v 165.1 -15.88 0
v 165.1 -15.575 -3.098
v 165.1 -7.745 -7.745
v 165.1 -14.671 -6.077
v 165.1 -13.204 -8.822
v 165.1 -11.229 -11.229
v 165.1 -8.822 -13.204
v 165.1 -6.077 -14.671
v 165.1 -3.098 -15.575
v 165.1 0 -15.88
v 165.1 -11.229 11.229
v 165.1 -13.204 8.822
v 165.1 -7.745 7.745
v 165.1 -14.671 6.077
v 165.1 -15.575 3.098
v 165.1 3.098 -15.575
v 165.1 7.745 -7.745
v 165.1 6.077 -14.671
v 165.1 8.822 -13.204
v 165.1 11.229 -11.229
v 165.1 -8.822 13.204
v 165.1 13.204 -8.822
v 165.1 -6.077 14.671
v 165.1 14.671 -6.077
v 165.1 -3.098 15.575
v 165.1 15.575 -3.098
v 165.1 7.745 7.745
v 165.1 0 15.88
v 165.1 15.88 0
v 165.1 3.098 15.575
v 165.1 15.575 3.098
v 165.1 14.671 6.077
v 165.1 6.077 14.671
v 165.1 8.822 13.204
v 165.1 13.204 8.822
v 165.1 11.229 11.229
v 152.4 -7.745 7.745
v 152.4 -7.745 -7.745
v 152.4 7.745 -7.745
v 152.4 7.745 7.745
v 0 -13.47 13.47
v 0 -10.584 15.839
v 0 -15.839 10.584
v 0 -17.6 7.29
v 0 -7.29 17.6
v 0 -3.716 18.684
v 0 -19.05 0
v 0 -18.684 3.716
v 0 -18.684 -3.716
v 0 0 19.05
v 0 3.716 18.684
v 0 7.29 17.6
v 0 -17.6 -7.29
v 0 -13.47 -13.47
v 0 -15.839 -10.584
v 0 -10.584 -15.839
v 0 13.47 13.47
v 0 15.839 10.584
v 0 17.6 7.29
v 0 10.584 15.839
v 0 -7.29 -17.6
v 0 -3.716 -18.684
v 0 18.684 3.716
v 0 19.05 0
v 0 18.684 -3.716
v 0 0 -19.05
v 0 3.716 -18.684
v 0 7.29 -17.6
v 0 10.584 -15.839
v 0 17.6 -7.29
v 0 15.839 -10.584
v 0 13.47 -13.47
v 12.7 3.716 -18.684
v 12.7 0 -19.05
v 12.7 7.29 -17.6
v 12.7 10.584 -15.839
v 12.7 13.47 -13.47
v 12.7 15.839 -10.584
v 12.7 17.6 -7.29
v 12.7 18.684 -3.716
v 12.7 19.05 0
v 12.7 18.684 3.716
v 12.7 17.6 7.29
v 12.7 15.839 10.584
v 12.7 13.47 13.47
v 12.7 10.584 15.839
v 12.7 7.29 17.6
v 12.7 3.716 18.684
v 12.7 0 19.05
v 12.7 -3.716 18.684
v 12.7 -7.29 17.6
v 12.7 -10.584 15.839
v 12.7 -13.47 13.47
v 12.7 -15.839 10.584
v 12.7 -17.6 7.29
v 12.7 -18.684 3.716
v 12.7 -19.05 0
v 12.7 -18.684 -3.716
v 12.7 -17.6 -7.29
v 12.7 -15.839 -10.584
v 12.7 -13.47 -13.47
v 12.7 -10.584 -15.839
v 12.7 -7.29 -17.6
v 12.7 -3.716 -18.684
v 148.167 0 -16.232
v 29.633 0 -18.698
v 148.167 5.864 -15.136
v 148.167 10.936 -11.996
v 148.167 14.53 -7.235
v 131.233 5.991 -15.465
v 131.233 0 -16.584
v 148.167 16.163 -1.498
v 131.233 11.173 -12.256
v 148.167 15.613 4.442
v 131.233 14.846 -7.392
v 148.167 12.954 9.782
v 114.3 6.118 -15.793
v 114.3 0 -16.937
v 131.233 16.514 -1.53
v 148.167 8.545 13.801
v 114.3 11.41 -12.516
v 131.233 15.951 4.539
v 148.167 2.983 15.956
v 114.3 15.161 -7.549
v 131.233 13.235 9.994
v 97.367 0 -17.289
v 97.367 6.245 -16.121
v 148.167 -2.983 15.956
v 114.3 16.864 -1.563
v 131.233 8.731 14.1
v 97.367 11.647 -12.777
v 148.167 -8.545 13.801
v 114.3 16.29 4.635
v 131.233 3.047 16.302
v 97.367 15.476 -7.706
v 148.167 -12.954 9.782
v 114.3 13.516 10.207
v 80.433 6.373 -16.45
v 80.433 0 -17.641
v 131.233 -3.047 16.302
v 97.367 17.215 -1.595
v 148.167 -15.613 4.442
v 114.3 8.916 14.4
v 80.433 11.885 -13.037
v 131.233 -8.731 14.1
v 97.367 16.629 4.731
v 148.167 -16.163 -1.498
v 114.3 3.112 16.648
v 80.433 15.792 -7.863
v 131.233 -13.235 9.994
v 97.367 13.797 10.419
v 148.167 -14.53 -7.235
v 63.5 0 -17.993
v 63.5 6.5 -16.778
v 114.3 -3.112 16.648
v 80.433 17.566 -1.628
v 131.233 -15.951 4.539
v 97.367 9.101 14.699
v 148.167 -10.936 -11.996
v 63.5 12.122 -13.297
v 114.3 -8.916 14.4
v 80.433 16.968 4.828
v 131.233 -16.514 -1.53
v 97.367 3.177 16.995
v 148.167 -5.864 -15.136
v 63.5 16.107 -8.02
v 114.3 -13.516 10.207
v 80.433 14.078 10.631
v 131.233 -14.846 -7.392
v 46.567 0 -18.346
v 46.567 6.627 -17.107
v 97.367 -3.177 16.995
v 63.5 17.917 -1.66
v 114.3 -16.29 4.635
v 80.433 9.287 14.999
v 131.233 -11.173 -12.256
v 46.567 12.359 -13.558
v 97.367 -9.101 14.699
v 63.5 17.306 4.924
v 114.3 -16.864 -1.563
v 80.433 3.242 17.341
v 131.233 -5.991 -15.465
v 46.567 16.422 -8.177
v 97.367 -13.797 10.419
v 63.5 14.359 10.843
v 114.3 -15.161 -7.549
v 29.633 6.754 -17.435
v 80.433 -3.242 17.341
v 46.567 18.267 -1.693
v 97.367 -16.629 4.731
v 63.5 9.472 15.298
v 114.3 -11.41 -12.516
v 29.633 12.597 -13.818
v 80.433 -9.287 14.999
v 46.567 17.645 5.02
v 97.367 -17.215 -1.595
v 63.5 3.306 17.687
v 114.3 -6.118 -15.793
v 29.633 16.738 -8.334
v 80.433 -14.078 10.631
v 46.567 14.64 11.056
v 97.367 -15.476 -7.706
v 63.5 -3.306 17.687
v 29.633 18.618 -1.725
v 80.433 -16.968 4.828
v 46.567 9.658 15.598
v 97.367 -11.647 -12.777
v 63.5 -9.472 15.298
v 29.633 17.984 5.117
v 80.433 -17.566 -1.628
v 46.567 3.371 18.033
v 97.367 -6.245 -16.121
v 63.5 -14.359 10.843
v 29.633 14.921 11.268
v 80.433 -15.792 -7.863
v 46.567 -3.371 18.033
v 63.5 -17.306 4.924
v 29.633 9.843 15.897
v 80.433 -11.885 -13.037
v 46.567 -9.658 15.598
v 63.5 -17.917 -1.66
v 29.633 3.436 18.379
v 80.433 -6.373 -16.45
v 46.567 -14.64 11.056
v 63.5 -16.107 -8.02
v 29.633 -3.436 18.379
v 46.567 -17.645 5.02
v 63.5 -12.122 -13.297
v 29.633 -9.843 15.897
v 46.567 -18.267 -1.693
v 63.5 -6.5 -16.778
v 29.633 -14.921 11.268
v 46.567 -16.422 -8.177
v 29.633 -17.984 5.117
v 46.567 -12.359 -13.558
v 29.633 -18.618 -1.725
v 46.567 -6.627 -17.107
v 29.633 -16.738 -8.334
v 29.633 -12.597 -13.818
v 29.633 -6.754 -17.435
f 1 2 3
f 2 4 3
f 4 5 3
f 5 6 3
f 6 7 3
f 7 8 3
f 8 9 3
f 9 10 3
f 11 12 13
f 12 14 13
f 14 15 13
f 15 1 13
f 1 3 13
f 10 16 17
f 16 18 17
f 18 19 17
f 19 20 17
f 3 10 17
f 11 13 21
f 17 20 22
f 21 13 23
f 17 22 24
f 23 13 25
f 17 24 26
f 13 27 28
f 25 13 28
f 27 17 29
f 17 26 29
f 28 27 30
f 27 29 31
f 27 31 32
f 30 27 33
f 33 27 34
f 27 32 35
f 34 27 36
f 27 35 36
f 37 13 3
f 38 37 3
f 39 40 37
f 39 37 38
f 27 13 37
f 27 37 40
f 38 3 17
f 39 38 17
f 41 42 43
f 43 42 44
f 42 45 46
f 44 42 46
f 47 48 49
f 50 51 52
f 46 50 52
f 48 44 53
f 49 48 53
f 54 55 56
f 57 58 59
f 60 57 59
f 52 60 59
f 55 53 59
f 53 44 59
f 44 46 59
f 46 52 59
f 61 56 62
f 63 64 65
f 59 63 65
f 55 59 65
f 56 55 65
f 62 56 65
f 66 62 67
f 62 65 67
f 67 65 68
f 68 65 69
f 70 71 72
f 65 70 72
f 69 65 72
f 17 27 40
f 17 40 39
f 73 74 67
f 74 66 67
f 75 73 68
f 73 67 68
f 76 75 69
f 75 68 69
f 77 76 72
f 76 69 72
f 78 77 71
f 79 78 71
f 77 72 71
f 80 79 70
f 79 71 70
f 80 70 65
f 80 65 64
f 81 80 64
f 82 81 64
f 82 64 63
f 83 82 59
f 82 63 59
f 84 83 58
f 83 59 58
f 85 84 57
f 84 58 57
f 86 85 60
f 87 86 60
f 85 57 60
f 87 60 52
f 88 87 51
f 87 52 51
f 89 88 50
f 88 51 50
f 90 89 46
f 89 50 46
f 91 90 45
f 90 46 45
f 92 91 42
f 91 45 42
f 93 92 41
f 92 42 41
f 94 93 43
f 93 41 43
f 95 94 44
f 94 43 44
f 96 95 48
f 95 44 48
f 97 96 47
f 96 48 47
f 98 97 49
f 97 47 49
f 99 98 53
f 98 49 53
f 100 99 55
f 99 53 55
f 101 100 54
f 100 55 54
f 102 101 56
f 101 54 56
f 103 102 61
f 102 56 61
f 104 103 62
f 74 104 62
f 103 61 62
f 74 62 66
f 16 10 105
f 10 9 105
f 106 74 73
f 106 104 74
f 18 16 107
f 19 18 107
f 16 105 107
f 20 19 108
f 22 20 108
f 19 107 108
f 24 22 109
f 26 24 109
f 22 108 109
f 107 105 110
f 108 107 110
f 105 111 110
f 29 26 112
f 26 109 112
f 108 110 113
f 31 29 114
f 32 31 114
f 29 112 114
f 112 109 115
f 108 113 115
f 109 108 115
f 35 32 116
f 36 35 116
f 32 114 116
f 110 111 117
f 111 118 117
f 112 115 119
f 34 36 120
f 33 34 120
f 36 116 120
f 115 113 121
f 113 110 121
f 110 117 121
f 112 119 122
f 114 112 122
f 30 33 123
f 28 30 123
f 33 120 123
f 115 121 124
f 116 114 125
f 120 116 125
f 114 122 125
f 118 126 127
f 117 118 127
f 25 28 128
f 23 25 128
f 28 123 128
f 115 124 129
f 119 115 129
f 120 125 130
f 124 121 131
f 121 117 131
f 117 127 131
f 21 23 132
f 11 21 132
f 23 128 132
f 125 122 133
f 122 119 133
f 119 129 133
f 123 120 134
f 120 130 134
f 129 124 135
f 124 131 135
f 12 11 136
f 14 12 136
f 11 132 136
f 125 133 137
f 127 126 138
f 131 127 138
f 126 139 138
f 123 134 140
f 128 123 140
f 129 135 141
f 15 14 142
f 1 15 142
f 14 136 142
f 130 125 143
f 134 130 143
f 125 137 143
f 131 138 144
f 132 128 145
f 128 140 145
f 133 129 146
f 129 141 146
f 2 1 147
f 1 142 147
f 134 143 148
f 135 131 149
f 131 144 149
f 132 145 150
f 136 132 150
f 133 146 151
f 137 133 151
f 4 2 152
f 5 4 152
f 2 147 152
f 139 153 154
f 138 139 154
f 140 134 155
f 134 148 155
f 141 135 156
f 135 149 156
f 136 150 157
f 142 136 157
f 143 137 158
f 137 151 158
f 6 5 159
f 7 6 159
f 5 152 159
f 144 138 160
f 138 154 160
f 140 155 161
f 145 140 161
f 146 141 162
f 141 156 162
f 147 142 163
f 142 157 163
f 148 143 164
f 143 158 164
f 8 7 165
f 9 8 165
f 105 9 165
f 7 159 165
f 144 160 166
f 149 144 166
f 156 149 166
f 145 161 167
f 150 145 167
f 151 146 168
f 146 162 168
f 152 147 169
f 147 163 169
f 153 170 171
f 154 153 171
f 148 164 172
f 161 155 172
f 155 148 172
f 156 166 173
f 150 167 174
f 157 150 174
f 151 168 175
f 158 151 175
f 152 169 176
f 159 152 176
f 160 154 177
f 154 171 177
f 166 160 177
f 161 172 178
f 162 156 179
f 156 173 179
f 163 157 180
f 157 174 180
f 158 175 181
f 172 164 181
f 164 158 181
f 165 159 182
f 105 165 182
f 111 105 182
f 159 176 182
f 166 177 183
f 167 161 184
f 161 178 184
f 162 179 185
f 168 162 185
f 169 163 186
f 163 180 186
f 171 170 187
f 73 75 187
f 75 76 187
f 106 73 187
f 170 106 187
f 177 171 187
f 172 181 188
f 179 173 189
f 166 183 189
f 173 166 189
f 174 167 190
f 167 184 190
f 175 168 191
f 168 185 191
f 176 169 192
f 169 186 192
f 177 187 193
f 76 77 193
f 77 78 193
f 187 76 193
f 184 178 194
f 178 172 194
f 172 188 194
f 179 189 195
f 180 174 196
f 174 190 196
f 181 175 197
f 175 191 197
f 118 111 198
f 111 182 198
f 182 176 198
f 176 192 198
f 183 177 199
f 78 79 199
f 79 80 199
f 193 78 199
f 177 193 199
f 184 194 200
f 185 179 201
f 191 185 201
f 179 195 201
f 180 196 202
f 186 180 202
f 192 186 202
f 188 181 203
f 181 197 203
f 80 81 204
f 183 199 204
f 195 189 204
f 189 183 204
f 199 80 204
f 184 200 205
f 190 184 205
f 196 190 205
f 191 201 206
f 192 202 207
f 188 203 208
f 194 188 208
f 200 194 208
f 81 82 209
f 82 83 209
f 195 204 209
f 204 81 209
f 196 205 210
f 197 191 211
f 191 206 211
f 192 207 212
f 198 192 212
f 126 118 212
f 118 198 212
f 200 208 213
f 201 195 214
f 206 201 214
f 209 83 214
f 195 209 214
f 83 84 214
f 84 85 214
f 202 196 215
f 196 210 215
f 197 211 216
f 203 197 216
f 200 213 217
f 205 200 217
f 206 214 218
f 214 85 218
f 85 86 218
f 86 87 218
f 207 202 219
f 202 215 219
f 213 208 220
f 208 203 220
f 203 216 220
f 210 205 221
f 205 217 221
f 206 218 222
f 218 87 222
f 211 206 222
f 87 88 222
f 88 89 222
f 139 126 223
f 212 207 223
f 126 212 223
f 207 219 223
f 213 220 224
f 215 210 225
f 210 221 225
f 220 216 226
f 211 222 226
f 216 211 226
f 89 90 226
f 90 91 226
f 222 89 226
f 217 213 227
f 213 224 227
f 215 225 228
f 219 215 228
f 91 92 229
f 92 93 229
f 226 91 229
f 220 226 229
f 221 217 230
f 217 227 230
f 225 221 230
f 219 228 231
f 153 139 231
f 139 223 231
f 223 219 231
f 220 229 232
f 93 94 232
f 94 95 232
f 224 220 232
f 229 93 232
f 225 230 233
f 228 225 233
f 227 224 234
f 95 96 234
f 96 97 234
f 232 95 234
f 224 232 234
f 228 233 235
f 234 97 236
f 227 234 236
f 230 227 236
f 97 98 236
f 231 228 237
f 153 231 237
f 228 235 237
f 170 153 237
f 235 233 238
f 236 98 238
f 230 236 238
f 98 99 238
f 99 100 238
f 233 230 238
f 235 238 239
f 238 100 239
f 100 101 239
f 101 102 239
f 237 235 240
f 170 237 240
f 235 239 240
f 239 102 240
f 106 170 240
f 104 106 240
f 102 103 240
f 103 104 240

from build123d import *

# Parameters (mm, degrees)
SKETCH2_W          = 15.49
SKETCH2_H          = 15.49
CUT_EXTRUDE1_DEPTH = 12.7


with BuildPart() as part:
    # Sketch1 → Revolve1 (revolve)
    with BuildSketch(Plane(origin=(0, 0, 0), x_dir=(1, 0, 0), z_dir=(0, 1, 0))):
        Polygon((0, 0), (165.1, 0), (165.1, 15.88), (12.7, 19.05), (0, 19.05), align=None)
    revolve(axis=Axis((0, 0, 0), (1, 0, 0)))

    # Sketch2 → Cut-Extrude1 (cut)
    with BuildSketch(Plane(origin=(165.1, 0, 0), x_dir=(0, 0, -1), z_dir=(1, 0, 0))):
        Rectangle(SKETCH2_W, SKETCH2_H)
    extrude(amount=-CUT_EXTRUDE1_DEPTH, mode=Mode.SUBTRACT)


solid = part.part
